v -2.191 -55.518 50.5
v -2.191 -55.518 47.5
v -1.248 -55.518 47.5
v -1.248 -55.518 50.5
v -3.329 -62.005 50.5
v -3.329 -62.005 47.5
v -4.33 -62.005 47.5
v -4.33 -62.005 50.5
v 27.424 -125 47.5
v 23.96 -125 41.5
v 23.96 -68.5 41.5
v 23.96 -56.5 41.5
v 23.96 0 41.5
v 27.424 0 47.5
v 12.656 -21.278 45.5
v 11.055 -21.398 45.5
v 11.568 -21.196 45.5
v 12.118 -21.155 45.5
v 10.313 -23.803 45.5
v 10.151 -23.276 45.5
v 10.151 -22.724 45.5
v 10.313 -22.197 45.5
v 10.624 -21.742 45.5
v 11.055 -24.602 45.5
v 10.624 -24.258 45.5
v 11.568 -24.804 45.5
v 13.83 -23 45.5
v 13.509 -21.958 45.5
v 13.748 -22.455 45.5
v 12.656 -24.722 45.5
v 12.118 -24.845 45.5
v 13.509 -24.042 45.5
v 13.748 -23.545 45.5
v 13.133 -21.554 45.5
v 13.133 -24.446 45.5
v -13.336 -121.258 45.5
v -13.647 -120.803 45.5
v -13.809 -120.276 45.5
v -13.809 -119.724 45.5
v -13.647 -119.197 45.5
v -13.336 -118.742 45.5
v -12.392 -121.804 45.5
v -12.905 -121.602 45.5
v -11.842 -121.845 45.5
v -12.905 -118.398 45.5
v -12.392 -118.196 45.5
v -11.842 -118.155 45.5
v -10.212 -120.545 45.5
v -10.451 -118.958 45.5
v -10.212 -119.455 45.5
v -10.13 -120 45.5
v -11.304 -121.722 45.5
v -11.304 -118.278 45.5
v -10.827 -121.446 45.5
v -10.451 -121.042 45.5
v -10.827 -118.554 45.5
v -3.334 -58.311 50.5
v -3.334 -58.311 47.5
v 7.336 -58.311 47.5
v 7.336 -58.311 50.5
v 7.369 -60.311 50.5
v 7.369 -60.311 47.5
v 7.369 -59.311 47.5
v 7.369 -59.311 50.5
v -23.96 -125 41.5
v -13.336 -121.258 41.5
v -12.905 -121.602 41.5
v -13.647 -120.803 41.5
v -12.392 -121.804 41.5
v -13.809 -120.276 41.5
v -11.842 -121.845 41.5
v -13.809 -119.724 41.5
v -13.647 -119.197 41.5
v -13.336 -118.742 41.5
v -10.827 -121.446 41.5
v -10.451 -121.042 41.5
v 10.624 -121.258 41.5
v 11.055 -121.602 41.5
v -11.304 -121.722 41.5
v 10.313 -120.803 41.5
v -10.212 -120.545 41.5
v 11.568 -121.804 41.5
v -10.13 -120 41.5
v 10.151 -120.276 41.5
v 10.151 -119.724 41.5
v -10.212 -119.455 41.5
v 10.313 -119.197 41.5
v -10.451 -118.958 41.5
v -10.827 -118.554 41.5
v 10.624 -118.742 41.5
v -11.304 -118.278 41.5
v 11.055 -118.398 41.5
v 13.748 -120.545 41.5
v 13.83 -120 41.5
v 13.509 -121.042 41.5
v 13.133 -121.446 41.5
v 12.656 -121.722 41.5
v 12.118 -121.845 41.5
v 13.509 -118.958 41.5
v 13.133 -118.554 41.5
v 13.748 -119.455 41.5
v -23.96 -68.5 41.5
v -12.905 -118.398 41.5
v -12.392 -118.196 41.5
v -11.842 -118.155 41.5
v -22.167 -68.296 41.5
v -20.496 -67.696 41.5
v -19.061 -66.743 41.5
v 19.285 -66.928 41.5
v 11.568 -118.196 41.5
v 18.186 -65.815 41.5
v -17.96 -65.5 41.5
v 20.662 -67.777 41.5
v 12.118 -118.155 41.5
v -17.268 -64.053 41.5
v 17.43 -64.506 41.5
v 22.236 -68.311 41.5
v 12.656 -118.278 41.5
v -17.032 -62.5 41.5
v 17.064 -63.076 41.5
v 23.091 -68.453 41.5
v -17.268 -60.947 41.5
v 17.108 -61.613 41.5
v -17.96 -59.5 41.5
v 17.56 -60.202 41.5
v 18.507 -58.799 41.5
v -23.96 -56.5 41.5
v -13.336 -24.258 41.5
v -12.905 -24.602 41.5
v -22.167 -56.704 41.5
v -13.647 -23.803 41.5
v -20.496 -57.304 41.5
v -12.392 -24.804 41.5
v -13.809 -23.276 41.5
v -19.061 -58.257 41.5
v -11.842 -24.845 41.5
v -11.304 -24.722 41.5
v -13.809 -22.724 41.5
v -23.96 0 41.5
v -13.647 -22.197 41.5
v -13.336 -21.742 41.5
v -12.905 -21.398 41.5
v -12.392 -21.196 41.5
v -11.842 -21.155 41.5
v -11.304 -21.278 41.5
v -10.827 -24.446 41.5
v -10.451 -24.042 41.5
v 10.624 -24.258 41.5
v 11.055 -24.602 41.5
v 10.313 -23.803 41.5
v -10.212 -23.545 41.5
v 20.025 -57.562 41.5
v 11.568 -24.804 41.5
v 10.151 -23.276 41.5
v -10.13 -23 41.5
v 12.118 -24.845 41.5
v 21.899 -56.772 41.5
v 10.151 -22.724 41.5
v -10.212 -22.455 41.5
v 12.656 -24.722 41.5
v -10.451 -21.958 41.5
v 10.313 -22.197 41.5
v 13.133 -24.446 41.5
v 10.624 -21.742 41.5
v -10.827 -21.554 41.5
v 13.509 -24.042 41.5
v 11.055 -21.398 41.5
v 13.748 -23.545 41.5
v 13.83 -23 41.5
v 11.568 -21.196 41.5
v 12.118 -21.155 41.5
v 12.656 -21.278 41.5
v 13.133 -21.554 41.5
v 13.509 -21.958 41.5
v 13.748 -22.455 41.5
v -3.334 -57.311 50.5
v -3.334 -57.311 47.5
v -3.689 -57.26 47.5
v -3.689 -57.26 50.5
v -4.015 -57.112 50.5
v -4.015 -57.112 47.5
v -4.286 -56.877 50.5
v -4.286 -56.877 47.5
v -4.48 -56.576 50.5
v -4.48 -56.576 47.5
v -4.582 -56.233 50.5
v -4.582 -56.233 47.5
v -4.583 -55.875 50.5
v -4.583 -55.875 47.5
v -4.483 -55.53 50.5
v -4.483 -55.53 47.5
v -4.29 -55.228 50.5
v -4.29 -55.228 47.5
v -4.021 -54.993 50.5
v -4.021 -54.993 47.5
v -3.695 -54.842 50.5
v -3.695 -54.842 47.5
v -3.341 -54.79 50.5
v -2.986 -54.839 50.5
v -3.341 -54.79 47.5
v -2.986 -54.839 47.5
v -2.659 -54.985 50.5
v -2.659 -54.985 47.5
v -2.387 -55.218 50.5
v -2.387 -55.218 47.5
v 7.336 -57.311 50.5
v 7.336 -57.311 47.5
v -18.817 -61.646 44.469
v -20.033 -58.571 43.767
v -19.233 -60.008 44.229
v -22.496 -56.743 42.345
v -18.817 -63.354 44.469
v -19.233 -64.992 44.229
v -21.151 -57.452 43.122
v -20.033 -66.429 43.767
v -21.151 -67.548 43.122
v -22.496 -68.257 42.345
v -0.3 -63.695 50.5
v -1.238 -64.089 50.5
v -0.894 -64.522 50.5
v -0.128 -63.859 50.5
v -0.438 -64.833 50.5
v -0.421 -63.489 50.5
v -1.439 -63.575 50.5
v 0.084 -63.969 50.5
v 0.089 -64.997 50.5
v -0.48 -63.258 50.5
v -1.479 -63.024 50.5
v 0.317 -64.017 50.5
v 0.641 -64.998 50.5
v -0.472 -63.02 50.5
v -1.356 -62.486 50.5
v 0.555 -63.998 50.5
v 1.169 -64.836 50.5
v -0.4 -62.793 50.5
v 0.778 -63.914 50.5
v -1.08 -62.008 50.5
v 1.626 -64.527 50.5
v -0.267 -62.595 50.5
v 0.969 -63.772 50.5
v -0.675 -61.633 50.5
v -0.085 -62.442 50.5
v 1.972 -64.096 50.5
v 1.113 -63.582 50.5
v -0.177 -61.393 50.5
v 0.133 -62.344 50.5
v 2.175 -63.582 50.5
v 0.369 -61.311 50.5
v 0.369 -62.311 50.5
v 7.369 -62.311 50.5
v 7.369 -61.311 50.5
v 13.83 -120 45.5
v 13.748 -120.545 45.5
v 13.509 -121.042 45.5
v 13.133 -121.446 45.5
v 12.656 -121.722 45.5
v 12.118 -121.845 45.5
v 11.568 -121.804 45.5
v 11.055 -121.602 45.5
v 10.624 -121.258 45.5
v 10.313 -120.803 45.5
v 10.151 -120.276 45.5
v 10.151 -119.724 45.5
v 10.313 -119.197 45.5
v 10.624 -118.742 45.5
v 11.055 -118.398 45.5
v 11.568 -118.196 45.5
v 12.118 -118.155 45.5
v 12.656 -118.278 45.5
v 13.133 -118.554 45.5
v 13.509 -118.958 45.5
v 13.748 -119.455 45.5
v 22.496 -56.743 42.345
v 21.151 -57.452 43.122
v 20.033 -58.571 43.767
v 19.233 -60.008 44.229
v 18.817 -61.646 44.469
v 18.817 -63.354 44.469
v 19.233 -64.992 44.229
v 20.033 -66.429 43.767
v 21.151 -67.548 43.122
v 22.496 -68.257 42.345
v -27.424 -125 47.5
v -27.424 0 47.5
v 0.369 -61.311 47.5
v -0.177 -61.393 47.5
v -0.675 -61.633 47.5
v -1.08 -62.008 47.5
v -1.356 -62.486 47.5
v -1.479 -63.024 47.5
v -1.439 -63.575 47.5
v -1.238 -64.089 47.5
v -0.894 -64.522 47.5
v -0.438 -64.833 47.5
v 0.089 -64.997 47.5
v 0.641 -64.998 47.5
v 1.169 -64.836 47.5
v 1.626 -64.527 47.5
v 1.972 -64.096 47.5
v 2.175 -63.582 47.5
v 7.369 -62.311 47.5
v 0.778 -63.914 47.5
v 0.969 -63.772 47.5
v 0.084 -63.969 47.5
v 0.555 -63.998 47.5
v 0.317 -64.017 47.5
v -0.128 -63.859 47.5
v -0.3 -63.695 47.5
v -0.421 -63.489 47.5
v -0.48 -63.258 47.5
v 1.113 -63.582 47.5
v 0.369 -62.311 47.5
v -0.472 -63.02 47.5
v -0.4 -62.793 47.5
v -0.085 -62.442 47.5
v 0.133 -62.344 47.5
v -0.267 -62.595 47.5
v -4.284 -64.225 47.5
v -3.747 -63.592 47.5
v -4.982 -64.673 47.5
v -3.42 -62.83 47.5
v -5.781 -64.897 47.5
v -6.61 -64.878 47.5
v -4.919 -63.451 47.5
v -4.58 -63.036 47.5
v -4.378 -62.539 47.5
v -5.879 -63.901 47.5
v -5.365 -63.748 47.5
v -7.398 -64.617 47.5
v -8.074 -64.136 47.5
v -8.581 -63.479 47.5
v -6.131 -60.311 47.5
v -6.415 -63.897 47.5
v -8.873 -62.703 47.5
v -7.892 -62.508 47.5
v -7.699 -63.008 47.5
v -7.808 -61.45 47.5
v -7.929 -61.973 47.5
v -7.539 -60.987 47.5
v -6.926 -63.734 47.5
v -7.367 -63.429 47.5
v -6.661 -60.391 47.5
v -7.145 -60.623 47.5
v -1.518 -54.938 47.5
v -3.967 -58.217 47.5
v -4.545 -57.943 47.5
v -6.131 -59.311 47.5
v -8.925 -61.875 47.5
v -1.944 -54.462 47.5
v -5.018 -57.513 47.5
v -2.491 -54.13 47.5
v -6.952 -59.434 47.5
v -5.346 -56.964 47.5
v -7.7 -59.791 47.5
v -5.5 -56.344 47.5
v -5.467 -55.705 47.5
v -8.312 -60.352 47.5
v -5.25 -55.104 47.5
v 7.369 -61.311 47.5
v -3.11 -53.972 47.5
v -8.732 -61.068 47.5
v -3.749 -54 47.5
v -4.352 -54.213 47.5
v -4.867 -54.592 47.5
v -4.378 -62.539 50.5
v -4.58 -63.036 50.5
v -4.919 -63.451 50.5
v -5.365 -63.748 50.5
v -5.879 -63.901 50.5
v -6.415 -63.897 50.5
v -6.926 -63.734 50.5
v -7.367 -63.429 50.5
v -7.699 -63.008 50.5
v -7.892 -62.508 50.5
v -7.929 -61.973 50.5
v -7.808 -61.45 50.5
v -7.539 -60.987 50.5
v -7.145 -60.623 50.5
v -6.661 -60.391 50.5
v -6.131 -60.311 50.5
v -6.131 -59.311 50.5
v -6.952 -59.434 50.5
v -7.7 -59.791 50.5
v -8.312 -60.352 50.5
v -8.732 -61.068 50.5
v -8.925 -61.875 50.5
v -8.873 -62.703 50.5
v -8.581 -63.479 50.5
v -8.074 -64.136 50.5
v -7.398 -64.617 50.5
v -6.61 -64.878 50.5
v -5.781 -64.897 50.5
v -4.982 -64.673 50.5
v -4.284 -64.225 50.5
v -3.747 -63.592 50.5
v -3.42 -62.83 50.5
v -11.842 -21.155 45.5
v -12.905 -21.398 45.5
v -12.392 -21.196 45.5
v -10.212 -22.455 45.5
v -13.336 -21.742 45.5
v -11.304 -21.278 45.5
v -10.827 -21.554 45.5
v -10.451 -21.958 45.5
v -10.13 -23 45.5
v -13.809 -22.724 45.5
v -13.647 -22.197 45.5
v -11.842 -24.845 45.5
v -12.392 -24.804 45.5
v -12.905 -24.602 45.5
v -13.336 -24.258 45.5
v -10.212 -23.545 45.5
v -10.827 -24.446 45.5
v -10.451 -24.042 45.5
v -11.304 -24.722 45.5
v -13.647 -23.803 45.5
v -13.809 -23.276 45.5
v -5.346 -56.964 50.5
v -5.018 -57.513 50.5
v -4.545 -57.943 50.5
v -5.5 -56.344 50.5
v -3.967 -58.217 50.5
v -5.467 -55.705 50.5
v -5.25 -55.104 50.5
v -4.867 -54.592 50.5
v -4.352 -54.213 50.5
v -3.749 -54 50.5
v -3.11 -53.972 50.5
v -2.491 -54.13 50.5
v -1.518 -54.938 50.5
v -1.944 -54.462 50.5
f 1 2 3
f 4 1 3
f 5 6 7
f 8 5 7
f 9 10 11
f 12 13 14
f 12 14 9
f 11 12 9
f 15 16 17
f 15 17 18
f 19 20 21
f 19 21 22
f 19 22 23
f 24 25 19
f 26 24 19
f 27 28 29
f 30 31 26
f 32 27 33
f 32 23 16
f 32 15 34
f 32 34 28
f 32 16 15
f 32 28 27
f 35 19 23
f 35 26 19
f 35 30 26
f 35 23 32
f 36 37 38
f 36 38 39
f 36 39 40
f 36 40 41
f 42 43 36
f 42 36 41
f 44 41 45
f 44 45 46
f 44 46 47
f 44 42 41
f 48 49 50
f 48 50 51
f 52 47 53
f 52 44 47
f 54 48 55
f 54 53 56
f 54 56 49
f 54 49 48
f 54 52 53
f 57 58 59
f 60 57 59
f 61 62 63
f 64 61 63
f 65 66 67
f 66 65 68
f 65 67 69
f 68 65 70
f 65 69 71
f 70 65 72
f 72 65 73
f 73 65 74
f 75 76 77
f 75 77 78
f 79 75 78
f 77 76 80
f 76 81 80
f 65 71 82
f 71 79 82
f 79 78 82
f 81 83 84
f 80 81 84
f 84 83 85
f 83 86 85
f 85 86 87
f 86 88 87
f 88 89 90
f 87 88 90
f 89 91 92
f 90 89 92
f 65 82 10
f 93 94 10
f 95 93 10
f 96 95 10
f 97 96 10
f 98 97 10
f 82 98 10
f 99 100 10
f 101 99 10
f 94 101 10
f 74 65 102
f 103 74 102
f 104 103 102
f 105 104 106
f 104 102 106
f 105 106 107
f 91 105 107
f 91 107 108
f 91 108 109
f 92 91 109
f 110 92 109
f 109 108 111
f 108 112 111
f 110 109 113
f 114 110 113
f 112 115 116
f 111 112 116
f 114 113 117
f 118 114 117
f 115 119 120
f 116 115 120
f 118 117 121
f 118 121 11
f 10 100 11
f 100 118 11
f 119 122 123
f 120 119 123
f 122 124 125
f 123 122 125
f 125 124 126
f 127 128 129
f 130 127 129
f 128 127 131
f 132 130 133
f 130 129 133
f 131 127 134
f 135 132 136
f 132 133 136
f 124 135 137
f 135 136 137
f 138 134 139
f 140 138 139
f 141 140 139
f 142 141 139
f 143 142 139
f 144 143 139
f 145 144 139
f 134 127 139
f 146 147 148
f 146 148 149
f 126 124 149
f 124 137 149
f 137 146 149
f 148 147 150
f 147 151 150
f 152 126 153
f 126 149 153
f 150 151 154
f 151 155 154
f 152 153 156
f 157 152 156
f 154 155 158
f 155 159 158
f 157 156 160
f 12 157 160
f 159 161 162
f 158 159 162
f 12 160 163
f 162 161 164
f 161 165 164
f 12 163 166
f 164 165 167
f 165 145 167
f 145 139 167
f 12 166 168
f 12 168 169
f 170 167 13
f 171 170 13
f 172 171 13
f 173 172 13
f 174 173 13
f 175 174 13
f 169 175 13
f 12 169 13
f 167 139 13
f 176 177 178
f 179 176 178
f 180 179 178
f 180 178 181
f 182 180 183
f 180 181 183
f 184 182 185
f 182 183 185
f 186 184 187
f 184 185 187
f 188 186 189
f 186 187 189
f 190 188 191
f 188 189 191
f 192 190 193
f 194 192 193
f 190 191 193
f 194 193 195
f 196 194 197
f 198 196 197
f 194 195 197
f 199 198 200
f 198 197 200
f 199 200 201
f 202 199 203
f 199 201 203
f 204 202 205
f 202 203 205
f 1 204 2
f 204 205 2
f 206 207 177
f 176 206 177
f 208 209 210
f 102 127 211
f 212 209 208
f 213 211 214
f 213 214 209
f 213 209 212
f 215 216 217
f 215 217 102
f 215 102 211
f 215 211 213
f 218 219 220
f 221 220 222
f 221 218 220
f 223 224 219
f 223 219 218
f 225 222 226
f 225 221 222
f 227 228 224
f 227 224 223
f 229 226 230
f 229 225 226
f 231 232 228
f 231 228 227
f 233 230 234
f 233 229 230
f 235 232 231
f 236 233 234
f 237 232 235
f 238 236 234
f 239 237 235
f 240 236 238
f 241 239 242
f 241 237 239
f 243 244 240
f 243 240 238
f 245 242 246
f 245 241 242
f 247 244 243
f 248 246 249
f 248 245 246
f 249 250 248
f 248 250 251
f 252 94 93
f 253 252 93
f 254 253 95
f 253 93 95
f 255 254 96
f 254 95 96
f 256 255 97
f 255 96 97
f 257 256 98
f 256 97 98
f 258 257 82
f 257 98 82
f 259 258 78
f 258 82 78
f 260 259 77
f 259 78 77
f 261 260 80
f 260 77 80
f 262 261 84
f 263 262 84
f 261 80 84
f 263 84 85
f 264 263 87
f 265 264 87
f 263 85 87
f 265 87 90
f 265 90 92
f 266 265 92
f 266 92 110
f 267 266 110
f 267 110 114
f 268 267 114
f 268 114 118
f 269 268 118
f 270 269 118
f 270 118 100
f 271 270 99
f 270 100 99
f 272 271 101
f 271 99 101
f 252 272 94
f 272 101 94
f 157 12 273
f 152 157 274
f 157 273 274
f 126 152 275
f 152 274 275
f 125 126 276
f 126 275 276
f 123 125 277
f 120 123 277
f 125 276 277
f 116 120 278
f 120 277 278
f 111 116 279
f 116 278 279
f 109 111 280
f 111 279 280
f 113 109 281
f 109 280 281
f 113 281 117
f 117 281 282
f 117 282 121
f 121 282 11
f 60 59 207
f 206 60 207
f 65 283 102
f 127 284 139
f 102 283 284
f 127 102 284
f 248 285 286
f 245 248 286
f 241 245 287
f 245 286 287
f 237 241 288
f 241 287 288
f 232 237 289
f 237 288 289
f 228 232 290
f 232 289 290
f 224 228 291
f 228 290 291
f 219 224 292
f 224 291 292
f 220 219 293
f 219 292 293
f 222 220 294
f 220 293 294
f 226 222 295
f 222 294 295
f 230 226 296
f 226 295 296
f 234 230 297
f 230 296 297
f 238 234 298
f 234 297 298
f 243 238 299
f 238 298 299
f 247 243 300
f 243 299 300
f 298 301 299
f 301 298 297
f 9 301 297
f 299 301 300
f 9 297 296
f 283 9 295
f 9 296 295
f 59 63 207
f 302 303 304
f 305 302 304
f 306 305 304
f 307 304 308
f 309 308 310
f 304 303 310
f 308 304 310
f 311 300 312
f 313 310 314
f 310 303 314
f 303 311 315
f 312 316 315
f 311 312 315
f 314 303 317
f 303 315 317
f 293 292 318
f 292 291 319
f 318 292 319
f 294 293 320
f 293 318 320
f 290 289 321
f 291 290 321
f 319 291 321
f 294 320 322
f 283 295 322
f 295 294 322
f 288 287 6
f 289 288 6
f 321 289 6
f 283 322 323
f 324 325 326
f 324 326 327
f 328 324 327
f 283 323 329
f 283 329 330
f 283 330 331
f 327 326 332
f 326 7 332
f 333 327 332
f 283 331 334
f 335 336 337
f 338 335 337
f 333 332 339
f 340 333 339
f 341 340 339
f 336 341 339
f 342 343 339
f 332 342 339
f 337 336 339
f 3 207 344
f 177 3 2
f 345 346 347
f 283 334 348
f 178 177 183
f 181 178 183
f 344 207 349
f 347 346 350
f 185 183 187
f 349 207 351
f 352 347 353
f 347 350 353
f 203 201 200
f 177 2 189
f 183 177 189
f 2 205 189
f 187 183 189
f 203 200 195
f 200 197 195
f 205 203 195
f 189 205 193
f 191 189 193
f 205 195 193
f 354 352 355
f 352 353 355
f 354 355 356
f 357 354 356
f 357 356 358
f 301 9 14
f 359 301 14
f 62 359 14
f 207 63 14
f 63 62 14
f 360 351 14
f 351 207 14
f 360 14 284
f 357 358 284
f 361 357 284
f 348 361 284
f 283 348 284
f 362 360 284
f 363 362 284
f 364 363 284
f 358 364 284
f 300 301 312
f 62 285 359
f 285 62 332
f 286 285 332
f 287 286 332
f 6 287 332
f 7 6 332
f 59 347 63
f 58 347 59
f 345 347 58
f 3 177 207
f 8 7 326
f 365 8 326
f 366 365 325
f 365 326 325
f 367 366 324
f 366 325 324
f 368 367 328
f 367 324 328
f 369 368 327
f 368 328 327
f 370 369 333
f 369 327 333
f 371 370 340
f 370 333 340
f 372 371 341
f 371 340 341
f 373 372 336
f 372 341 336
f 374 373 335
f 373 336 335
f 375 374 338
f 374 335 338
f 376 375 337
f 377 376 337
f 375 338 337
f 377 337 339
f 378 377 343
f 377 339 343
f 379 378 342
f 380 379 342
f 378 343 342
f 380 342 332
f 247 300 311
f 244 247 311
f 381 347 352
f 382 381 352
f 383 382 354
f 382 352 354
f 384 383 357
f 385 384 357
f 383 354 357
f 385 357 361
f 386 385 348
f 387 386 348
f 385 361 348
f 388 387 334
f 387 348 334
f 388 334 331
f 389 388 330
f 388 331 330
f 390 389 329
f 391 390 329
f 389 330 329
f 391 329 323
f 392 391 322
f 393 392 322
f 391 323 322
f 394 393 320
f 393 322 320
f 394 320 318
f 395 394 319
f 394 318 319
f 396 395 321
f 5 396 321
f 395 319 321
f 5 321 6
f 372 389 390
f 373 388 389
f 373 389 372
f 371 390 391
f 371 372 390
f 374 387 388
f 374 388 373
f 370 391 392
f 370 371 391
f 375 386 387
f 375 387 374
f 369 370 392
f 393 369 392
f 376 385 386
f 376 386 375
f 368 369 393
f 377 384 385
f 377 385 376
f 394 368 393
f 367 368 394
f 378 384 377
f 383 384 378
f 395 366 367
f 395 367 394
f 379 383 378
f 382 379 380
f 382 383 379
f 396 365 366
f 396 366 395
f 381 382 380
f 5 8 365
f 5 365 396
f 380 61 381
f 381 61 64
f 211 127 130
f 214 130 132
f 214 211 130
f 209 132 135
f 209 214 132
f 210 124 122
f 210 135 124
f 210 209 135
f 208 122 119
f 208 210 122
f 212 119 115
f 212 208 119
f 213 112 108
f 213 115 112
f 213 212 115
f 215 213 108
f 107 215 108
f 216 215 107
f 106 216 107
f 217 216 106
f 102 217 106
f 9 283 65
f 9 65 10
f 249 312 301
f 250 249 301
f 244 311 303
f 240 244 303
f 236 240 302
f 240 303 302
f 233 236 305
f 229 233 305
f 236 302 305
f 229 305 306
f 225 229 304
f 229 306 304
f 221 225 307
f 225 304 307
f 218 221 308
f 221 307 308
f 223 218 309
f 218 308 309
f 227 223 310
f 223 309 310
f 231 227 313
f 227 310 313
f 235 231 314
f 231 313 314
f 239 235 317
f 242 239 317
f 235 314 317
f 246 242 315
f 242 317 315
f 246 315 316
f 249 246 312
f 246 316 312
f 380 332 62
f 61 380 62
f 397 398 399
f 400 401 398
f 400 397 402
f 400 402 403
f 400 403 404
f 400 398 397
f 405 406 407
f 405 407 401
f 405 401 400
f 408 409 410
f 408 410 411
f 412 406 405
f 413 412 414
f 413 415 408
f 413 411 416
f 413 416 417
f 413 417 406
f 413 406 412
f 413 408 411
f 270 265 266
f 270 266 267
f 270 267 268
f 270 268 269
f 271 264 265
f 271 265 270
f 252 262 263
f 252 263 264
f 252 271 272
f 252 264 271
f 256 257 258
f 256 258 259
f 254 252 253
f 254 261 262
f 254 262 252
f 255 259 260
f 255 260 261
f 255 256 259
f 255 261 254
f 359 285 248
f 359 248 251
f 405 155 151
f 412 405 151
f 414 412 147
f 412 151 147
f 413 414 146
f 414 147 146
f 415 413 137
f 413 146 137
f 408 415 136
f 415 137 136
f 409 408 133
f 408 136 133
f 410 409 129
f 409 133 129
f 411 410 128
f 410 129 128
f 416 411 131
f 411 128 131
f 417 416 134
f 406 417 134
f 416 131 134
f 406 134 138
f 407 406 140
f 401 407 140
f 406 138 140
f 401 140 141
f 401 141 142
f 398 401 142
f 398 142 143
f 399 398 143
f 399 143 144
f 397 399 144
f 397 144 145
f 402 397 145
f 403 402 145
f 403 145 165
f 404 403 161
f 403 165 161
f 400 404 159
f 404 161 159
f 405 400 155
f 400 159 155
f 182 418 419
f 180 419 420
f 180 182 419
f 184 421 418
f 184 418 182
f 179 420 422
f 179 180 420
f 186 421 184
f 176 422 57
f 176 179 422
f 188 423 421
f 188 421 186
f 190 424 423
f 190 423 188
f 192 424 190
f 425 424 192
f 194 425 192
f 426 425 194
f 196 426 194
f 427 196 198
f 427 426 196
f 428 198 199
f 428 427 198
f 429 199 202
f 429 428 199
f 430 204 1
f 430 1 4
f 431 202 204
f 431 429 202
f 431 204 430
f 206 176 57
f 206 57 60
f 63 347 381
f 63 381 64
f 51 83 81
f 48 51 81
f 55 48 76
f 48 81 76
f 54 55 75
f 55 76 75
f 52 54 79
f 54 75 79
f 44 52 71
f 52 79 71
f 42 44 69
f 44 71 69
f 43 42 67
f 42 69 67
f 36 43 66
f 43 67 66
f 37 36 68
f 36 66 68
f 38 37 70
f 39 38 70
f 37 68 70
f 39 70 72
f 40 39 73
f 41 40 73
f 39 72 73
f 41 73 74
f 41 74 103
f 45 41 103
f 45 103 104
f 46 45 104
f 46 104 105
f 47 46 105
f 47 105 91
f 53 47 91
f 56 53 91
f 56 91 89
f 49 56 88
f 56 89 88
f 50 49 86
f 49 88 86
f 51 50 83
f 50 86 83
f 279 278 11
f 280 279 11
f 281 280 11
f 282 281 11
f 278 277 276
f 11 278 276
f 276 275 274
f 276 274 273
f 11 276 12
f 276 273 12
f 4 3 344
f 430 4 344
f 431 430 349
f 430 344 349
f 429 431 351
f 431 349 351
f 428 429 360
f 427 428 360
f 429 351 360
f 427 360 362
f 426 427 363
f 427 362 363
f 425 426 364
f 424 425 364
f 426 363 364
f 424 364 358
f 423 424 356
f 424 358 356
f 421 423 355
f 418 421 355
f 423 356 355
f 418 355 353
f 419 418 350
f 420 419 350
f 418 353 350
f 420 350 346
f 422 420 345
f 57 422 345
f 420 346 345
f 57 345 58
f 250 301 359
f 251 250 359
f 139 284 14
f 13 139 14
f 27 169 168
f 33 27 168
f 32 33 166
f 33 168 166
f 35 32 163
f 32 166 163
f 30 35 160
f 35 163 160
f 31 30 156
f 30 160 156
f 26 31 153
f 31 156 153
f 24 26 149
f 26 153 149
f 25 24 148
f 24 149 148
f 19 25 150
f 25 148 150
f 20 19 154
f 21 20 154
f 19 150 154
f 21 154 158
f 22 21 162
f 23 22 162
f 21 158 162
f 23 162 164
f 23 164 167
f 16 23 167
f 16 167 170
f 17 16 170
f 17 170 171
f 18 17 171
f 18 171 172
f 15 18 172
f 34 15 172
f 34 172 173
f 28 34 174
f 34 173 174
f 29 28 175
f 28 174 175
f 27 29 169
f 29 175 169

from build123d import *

# Parameters (mm, degrees)
F1_DEPTH  = 125
F2_R      = 1.85
F3_DEPTH  = 4
F4_W      = 7
F4_H      = 1
F4_W_2    = 13.5
F4_W_3    = 10.669845
F5_DEPTH  = 3
F7_R      = 6
F8_DEPTH  = 25
F10_R     = 6
F11_DEPTH = 25


with BuildPart() as f1:
    # F0 (on Front) → F1 (new body)
    with BuildSketch(Plane.XZ):
        Polygon((27.424138, 47.5), (-27.424138, 47.5), (-23.960036, 41.5), (23.960036, 41.5), align=None)
    extrude(amount=F1_DEPTH)

    # F2 (on face) → F3 (cut)
    with BuildSketch(Plane(origin=(0, 0, 41.5), x_dir=(1, 0, 0), z_dir=(0, 0, -1))):
        with BuildLine():
            ThreePointArc((-13.830018, 120), (-11.980018, 118.15), (-10.130018, 120))
            Line((-10.130018, 120), (-13.830018, 120))
        make_face()
        with BuildLine():
            Line((-13.830018, 120), (-10.130018, 120))
            ThreePointArc((-10.130018, 120), (-11.980018, 121.85), (-13.830018, 120))
        make_face()
        with Locations((11.980018, 120)):
            Circle(F2_R)
        with BuildLine():
            ThreePointArc((-13.830018, 23), (-11.980018, 21.15), (-10.130018, 23))
            Line((-10.130018, 23), (-13.830018, 23))
        make_face()
        with BuildLine():
            Line((-13.830018, 23), (-10.130018, 23))
            ThreePointArc((-10.130018, 23), (-11.980018, 24.85), (-13.830018, 23))
        make_face()
        with Locations((11.980018, 23)):
            Circle(F2_R)
    extrude(amount=-F3_DEPTH, mode=Mode.SUBTRACT)

    # F4 (on face) → F5 (join)
    with BuildSketch(Plane.XY.offset(47.5)):
        with Locations((3.868914, -61.811117)):
            Rectangle(F4_W, F4_H)
        with BuildLine():
            ThreePointArc((1.113392, -63.582205), (-0.367617, -63.596068), (0.368914, -62.311117))
            Line((0.368914, -62.311117), (0.368914, -61.311117))
            ThreePointArc((0.368914, -61.311117), (-1.08188, -64.318326), (2.174842, -63.582205))
            Line((2.174842, -63.582205), (1.113392, -63.582205))
        make_face()
        with BuildLine():
            ThreePointArc((-4.330444, -62.004982), (-7.367157, -63.429113), (-6.131086, -60.311117))
            Line((-6.131086, -60.311117), (-6.131086, -59.311117))
            ThreePointArc((-6.131086, -59.311117), (-8.074487, -64.136422), (-3.329243, -62.004982))
            Line((-3.329243, -62.004982), (-4.330444, -62.004982))
        make_face()
        with Locations((0.618914, -59.811117)):
            Rectangle(F4_W_2, F4_H)
        with Locations((2.000717, -57.811117)):
            Rectangle(F4_W_3, F4_H)
        with BuildLine():
            ThreePointArc((-3.334205, -57.311117), (-4.397356, -55.372555), (-2.191203, -55.518156))
            Line((-2.191203, -55.518156), (-1.248077, -55.518156))
            ThreePointArc((-1.248077, -55.518156), (-5.077231, -54.833641), (-3.334205, -58.311117))
            Line((-3.334205, -58.311117), (-3.334205, -57.311117))
        make_face()
    extrude(amount=F5_DEPTH)

    # F7 (on face) → F8 (cut)
    with BuildSketch(Plane(origin=(-23.960036, 0, 41.5), x_dir=(0.866025, 0, 0.5), z_dir=(0.5, 0, -0.866025))):
        with Locations((0, 62.5)):
            Circle(F7_R)
    extrude(amount=F8_DEPTH, mode=Mode.SUBTRACT)

    # F10 (on face) → F11 (cut)
    with BuildSketch(Plane(origin=(23.960036, 0, 41.5), x_dir=(0.866025, 0, -0.5), z_dir=(0.5, 0, 0.866025))):
        with Locations((0, -62.5)):
            Circle(F10_R)
    extrude(amount=-F11_DEPTH, mode=Mode.SUBTRACT)


solid = f1.part
